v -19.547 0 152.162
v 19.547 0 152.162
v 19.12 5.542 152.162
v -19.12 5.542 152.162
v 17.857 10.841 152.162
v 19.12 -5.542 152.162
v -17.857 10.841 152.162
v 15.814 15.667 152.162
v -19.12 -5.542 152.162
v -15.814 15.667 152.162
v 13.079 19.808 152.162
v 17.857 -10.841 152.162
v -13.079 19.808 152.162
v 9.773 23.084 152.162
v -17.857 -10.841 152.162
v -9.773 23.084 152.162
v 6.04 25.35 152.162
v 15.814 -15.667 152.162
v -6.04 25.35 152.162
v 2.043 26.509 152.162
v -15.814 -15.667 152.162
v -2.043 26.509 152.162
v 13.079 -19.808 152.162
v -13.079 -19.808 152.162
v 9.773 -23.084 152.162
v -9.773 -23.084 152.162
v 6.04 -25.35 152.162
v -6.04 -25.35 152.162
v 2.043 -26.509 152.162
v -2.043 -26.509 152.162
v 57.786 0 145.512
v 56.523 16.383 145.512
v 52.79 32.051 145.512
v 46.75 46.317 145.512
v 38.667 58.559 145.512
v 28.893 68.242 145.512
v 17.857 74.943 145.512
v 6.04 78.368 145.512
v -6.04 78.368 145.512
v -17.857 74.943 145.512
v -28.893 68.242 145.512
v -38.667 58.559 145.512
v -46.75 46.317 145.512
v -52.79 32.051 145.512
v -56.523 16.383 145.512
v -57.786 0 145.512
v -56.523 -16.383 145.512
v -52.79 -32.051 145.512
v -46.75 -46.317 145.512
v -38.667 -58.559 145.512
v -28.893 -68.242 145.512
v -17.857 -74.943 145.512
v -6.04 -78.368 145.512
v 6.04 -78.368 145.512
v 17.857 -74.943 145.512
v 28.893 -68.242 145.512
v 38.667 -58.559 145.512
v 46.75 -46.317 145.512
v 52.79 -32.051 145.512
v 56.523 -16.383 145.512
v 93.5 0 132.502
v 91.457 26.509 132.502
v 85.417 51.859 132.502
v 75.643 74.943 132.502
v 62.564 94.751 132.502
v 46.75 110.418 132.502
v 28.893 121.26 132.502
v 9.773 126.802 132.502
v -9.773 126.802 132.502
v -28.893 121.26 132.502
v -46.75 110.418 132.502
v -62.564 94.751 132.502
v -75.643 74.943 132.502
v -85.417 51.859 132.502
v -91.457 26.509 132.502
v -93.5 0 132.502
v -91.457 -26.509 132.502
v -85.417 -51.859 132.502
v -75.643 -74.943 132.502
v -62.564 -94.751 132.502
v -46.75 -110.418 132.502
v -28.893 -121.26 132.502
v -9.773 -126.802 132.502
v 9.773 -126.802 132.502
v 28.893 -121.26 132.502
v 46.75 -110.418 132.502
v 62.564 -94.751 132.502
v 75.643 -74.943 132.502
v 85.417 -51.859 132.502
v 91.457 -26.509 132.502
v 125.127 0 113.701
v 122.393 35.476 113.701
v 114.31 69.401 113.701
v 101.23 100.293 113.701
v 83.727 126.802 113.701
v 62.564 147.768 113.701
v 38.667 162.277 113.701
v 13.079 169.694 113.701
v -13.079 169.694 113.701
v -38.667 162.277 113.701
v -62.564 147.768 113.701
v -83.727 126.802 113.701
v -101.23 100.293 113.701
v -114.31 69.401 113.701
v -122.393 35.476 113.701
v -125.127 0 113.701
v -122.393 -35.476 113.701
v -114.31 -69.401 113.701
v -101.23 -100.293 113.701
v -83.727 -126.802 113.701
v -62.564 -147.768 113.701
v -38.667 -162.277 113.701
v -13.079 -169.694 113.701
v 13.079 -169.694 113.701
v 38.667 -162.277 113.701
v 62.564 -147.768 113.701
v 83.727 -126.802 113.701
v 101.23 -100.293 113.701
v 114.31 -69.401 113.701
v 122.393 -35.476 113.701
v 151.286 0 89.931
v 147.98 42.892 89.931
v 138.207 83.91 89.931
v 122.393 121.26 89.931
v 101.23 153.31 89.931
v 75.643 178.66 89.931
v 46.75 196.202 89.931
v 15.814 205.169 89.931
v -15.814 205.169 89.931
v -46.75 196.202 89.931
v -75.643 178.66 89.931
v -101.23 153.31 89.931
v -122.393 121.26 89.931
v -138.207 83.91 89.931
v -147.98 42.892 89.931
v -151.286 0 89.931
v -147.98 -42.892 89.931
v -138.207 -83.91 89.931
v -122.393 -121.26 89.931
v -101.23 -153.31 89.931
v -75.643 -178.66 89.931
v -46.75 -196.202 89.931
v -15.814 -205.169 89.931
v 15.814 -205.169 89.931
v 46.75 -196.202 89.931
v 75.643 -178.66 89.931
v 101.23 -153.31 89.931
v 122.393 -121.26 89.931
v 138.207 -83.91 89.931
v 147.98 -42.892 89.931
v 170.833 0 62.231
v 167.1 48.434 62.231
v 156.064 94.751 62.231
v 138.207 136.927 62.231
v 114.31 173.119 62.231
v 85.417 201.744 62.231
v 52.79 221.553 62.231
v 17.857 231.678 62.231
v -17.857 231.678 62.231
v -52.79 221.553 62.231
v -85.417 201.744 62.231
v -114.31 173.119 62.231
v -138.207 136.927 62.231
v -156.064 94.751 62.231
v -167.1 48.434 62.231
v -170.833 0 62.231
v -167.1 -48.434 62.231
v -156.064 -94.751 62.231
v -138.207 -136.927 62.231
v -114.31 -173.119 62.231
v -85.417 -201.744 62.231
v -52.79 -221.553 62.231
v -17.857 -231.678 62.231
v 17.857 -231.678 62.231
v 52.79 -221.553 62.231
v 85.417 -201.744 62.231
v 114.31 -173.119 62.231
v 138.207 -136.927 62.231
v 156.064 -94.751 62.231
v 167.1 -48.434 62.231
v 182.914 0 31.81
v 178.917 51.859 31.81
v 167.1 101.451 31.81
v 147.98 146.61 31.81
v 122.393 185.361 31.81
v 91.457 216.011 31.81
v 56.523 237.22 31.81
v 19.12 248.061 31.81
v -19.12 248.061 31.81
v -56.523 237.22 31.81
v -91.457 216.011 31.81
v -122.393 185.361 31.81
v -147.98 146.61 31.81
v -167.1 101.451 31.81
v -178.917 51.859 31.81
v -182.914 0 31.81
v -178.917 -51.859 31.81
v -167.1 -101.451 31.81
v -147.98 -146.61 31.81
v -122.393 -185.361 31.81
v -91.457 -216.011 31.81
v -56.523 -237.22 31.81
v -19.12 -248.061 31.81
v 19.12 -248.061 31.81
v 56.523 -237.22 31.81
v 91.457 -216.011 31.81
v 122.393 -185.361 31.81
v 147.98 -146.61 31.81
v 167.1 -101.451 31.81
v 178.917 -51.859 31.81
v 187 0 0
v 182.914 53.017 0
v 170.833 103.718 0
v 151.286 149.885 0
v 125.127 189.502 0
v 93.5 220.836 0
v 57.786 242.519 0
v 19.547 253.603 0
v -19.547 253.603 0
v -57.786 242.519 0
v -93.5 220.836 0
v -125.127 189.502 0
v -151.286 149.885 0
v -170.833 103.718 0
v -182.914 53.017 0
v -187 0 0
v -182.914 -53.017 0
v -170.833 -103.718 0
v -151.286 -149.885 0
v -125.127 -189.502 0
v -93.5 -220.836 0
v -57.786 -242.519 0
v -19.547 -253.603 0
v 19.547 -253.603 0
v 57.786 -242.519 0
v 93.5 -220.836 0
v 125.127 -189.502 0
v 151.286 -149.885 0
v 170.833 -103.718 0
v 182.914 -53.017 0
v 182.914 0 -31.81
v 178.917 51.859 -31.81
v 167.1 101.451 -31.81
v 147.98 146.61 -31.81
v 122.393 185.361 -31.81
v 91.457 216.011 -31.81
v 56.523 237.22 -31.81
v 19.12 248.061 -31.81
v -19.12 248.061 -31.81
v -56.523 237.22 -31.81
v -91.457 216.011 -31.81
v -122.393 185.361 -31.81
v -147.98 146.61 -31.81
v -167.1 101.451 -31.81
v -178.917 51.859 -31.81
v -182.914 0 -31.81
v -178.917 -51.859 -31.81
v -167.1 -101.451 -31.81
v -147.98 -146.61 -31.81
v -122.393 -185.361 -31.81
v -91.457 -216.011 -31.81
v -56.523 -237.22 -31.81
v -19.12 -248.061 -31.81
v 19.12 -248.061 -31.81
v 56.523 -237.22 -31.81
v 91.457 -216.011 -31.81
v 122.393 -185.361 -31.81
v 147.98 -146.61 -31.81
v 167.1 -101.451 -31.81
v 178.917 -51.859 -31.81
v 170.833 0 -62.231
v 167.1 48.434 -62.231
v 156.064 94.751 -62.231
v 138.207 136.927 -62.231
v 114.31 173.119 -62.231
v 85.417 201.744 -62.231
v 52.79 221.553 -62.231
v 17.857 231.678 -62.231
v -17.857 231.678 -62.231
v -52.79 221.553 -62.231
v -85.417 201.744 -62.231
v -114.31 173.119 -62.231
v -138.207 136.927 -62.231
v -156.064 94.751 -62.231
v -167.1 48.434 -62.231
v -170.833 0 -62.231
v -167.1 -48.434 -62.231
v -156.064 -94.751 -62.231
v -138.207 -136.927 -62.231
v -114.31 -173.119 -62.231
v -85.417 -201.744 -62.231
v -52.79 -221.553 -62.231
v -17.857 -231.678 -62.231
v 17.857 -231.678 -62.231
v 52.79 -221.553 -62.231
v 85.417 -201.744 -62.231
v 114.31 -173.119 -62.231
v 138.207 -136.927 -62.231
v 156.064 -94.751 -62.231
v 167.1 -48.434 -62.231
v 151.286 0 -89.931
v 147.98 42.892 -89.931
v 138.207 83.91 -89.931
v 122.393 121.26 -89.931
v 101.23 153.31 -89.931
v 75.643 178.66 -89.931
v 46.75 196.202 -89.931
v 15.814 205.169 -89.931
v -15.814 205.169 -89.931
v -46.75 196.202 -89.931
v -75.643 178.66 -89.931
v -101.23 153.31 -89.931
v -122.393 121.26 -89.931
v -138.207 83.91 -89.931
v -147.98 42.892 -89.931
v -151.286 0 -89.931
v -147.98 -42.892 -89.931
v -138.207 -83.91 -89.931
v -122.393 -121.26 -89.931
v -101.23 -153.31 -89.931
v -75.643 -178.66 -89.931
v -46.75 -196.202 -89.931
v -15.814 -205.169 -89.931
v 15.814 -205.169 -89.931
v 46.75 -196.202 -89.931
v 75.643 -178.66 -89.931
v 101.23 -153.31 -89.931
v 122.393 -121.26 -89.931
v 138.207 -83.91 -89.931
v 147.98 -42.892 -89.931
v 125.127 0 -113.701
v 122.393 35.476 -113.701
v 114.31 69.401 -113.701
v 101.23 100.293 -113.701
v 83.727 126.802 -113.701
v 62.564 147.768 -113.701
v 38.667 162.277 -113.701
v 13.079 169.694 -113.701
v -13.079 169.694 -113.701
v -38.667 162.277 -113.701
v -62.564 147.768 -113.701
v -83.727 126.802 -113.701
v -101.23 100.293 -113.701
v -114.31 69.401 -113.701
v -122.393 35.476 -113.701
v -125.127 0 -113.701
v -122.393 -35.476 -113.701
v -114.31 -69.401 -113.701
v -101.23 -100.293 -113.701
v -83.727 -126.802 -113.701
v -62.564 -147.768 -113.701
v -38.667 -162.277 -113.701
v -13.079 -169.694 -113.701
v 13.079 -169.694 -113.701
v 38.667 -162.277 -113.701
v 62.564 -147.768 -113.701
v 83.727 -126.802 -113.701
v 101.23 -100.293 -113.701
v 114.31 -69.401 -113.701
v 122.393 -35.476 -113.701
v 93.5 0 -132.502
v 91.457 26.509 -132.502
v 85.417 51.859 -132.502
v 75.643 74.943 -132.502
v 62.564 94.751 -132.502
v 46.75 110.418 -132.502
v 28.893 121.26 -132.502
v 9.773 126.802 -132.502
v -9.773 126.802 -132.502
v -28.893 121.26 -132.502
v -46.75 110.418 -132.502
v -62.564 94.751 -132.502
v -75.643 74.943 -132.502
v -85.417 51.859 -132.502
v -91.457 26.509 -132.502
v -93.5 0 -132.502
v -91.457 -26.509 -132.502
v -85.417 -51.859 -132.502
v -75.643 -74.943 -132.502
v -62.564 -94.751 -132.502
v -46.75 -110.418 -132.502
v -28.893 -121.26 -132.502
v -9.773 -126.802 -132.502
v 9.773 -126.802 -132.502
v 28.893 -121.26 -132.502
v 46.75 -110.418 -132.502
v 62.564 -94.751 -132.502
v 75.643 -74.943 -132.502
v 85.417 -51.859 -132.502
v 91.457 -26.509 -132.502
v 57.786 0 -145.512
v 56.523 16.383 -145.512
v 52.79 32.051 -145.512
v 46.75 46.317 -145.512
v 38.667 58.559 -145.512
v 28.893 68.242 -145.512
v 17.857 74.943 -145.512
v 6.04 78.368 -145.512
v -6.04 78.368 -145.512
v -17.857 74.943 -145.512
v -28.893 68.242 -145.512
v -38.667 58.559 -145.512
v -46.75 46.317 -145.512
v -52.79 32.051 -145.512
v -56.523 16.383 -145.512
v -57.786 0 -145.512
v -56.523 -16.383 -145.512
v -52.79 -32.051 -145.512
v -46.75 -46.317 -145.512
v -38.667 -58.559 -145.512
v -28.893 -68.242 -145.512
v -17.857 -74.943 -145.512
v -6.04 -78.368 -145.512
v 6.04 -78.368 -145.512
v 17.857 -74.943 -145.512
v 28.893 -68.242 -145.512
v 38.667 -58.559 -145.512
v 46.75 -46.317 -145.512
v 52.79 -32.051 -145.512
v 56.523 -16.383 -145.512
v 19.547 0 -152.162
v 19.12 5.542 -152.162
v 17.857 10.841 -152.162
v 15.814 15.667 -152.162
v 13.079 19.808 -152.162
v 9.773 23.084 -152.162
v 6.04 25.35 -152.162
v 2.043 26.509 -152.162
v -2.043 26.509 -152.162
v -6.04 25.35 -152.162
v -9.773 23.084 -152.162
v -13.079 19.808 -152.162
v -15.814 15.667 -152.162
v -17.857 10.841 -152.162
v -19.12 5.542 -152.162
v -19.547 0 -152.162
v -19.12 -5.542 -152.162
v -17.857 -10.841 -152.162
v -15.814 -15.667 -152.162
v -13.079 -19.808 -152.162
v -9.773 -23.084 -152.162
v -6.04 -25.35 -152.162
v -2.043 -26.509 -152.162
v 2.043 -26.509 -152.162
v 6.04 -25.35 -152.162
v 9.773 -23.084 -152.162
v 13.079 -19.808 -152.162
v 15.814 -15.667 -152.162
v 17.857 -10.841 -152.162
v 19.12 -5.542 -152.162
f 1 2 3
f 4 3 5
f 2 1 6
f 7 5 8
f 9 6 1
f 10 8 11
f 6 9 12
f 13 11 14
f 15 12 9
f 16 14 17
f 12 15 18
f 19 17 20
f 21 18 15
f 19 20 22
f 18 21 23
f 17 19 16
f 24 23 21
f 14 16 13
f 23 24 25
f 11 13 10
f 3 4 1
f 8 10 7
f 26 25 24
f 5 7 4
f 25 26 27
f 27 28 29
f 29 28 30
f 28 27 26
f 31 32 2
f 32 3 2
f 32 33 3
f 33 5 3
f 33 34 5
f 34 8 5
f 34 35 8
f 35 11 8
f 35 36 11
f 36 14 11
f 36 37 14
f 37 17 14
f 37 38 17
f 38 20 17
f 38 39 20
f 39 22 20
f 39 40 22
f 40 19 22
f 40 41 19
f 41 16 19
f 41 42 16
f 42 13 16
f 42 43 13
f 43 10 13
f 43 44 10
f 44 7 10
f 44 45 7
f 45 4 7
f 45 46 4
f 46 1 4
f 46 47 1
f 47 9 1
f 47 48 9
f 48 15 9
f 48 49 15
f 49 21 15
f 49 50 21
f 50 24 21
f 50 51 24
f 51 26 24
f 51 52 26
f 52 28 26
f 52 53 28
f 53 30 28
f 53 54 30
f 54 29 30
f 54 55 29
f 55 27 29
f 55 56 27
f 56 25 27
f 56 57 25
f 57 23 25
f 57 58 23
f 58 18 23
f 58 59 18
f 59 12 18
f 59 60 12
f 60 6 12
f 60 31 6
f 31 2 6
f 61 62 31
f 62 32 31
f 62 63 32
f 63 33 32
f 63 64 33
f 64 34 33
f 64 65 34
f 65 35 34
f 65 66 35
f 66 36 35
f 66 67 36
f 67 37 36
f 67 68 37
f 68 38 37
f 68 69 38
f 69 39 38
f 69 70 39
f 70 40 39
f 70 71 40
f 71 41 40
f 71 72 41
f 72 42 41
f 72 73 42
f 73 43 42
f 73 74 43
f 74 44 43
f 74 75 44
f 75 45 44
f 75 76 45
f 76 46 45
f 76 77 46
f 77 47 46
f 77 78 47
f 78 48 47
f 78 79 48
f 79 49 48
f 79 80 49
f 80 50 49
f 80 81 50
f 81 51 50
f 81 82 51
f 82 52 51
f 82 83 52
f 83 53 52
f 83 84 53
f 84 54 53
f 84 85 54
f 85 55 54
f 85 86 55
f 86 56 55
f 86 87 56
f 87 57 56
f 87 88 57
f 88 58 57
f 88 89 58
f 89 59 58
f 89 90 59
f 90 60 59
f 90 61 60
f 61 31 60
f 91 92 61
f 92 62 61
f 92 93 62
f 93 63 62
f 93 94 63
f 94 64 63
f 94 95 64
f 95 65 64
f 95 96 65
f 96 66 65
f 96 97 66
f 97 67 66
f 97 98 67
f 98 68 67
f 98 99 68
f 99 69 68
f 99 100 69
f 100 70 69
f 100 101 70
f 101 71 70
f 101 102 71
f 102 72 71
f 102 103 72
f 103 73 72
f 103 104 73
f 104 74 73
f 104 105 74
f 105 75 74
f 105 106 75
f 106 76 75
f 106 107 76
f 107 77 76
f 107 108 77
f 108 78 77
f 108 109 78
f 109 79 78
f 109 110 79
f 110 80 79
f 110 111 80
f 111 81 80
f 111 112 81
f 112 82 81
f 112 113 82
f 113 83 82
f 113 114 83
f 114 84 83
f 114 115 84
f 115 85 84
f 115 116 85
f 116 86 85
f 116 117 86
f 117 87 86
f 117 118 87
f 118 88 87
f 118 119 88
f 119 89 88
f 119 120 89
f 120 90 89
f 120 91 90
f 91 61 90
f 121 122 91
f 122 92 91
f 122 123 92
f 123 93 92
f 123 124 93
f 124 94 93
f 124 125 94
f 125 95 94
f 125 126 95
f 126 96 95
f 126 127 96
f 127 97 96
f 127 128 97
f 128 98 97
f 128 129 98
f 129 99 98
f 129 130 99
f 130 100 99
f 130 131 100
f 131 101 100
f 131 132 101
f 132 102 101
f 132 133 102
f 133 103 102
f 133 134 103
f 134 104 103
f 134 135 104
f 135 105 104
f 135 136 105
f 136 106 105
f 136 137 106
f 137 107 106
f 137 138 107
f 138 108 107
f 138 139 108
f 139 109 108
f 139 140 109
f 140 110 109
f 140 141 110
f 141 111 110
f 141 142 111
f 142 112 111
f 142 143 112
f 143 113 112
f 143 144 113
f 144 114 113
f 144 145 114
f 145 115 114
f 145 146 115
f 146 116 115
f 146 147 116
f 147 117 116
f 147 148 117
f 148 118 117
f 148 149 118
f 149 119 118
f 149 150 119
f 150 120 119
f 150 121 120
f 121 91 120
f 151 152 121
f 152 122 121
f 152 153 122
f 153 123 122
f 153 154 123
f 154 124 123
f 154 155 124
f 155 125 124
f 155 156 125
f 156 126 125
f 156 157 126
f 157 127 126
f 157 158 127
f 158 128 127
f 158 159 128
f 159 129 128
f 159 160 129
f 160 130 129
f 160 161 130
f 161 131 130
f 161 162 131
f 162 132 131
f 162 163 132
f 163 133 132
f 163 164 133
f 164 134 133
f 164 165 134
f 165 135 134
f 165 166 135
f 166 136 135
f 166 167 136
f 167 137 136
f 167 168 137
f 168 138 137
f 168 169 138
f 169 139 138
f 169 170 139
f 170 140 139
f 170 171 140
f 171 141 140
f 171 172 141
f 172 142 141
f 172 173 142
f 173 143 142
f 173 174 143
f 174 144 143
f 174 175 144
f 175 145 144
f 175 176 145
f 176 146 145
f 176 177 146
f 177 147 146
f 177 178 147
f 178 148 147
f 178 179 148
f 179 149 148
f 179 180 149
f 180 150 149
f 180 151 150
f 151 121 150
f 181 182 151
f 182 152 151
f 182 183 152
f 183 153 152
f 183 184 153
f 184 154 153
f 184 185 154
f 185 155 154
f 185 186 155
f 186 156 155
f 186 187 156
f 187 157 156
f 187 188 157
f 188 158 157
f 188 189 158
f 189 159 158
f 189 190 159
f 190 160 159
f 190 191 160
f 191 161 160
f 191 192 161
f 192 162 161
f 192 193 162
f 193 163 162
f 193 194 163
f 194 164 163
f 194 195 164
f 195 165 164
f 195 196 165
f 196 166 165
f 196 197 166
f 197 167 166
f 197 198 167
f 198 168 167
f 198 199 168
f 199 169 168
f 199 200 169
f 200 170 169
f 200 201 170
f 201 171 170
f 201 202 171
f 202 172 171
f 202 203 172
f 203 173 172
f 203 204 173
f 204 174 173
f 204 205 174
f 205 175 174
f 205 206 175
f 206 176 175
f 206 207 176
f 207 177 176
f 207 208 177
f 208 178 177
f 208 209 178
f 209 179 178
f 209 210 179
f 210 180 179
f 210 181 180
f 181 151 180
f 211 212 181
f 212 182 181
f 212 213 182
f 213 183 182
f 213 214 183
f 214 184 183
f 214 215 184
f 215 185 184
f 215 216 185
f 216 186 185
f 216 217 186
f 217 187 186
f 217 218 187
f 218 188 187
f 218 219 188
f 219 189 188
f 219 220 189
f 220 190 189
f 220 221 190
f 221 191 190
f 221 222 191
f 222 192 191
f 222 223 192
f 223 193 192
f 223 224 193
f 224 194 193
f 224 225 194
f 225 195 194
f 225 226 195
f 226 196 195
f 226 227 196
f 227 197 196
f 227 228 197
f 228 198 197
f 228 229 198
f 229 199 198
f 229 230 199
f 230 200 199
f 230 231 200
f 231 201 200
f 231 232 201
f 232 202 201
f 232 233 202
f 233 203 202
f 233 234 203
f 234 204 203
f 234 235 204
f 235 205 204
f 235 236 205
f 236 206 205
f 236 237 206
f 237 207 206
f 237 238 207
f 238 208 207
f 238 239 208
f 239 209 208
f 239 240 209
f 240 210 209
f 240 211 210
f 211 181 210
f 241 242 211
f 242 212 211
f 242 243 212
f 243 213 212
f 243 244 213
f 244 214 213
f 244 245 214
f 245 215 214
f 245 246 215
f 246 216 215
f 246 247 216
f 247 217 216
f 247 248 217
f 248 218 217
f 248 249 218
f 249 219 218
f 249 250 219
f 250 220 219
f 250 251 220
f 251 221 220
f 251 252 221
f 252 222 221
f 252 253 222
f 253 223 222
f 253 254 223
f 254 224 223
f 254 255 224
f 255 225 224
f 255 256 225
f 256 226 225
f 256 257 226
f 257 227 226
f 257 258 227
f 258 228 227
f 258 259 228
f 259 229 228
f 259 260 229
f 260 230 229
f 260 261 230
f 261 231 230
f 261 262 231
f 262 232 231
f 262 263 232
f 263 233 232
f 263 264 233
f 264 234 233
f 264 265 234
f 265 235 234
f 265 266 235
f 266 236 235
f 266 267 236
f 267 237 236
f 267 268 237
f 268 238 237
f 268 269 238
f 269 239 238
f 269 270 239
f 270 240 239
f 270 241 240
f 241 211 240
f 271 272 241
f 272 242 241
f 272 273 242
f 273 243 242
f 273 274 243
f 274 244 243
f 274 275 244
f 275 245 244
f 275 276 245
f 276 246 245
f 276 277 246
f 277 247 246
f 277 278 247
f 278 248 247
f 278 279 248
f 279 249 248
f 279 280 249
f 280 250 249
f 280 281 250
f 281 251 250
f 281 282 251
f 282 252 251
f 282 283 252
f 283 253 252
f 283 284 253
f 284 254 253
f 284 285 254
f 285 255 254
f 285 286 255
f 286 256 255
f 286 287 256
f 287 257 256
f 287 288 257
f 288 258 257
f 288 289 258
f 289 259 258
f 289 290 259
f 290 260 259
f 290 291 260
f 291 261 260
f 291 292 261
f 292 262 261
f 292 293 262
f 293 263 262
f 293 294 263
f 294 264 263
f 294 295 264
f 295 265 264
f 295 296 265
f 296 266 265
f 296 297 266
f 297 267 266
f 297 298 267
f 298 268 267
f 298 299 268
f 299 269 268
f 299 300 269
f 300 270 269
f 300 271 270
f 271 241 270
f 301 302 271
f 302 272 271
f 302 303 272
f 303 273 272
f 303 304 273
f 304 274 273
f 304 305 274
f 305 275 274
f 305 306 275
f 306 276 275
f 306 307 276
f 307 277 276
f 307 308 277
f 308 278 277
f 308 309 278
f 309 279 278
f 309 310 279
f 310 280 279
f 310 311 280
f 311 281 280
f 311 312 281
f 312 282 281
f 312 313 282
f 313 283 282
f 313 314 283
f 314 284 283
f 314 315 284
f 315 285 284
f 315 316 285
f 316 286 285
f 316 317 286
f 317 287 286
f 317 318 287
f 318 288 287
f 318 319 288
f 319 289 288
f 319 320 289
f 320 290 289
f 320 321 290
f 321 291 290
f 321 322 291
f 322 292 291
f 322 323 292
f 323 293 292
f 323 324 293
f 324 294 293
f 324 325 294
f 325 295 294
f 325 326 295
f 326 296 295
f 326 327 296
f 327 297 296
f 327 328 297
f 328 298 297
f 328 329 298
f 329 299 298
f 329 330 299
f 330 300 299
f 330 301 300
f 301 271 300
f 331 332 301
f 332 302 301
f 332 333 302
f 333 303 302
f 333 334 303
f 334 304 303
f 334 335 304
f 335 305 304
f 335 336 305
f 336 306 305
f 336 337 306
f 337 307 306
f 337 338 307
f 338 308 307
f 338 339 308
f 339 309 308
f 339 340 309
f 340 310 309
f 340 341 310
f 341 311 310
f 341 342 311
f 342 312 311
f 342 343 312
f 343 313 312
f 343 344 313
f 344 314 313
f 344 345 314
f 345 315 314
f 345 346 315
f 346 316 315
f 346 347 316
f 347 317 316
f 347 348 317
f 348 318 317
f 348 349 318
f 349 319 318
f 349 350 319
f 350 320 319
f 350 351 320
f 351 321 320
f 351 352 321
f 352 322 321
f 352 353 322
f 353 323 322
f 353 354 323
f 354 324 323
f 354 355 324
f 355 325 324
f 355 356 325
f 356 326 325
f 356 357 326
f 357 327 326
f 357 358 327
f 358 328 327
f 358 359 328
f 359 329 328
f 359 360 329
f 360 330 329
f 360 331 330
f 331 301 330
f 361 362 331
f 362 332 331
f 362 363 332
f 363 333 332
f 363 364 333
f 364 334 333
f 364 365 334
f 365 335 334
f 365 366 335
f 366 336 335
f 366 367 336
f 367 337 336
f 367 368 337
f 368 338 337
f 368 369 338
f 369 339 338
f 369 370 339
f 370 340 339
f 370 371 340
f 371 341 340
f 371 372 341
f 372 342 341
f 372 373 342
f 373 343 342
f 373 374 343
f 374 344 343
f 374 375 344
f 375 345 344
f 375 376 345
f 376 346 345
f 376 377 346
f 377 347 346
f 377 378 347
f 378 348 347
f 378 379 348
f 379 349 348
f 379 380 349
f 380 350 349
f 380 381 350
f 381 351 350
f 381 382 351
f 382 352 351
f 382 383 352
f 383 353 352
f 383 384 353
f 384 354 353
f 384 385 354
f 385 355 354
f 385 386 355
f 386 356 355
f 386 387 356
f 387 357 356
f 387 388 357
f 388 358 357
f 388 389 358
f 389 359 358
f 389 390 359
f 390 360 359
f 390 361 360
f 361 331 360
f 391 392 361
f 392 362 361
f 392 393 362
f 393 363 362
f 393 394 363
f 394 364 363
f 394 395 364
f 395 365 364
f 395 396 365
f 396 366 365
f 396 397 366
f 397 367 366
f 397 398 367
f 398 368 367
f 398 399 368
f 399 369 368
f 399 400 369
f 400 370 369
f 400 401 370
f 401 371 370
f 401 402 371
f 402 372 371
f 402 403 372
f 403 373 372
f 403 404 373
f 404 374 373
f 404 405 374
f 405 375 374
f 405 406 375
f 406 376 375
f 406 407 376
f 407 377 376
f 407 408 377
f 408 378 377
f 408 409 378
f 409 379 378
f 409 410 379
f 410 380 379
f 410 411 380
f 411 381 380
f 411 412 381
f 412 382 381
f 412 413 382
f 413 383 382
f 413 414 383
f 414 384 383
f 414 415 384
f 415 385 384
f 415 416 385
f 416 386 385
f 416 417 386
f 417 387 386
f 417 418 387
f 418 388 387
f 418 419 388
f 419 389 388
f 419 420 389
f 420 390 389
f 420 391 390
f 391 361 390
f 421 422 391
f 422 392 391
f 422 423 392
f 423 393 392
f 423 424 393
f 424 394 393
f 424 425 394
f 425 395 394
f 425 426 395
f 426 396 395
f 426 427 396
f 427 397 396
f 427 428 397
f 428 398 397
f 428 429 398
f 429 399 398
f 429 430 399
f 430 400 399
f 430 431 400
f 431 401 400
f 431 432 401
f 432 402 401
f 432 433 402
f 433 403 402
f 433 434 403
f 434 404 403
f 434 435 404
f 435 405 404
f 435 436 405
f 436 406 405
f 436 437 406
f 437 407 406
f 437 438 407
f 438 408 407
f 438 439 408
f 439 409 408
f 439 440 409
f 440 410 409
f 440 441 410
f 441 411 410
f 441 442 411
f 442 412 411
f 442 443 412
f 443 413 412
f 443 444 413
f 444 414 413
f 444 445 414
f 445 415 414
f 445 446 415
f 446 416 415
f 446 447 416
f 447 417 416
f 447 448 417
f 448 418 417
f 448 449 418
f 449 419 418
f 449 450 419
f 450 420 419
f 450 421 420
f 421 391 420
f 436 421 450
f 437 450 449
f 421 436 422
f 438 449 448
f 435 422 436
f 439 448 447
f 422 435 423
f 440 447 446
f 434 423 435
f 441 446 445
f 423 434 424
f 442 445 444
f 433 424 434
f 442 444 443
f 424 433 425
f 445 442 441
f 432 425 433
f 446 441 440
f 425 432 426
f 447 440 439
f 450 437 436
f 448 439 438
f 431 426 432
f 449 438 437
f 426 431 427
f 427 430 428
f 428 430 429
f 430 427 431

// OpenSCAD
// Generated by SolidPython 1.0.1 on 2020-07-29 00:46:50


scale(v = [11, 15, 9]) {
	sphere(r = 17);
}
/***********************************************
*********      SolidPython code:      **********
************************************************
 
# import packages: SolidPython
from solid import *
from solid.utils import *
from itertools import chain, combinations, permutations


class Resize:

    def __init__(self, scad_file):
        self.scad_file = scad_file
        #self.scad_file = import_scad(scad_file)
        # cone/cylinder param:
        self.r1 = 0
        self.r2 = 0
        self.h = 0
        # rectangular prism param:
        self.w = 0
        self.l = 0
        # ellipse param:
        self.r = 0

    # import OpenScad code (file name corresponds to shape)


    # classify shape + parameters
    def assign(self, param1, param2, param3):
        if self.scad_file == 'cone.scad':
            self.r1 = param1
            self.r2 = param2
            self.h = param3
        elif self.scad_file == 'cylinder.scad':
            self.r1 = param1
            self.r2 = param2
            self.h = param3
        elif self.scad_file == 'rectangularPrism.scad':
            self.h = param1
            self.l = param2
            self.w = param3
        else:
            self.r = param1
            self.h = param2

    # resize parameters
    def iterate(self):
        x = range(3, 20, 2)
        i = 1
        if self.scad_file == 'cone.scad':
            tempList = list(permutations(x, 2))
            for temp in tempList:
                param1 = temp[0]
                param2 = temp[1]
                filepath = 'produced_scad_files/' + 'cone' + str(param1) + '_' + str(param2) + '_' + '.scad'
                scad_render_to_file(cylinder(h=param1, r1=param2, r2=0), filepath)

        elif self.scad_file == 'cylinder.scad':
            tempList = list(permutations(x, 3))
            for temp in tempList:
                param1 = temp[0]
                param2 = temp[1]
                filepath = 'produced_scad_files/' + 'cylinder' + str(param1) + '_' + str(param2) + '_' + '.scad'
                scad_render_to_file(cylinder(h=param1, r1=param2, r2=param2), filepath)

        elif self.scad_file == 'rectangularPrism.scad':
            tempList = list(permutations(x, 3))
            for temp in tempList:
                param1 = temp[0]
                param2 = temp[1]
                param3 = temp[2]
                filepath = 'produced_scad_files/' + 'rectangularPrism' + str(param1) + '_' + str(param2) + '_' + str(
                    param3) + '.scad'
                scad_render_to_file(cube(size=(param1, param2, param3)), filepath)

        elif self.scad_file == 'ellipse.scad':
            tempList = list(permutations(x, 4))
            for temp in tempList:
                param1 = temp[0]
                param2 = temp[1]
                param3 = temp[2]
                param4 = temp[3]
                filepath = 'produced_scad_files/' + 'ellipse' + str(param1) + '_' + str(param2) + '_' + str(param3) + '_' + str(param4) + '.scad'
                scad_render_to_file(scale([param1, param2, param3])(sphere(r=param4)), filepath)

    def render_to_scadfile(self):
        scad_render_to_file(scad, 'example.scad') 
 
************************************************/
